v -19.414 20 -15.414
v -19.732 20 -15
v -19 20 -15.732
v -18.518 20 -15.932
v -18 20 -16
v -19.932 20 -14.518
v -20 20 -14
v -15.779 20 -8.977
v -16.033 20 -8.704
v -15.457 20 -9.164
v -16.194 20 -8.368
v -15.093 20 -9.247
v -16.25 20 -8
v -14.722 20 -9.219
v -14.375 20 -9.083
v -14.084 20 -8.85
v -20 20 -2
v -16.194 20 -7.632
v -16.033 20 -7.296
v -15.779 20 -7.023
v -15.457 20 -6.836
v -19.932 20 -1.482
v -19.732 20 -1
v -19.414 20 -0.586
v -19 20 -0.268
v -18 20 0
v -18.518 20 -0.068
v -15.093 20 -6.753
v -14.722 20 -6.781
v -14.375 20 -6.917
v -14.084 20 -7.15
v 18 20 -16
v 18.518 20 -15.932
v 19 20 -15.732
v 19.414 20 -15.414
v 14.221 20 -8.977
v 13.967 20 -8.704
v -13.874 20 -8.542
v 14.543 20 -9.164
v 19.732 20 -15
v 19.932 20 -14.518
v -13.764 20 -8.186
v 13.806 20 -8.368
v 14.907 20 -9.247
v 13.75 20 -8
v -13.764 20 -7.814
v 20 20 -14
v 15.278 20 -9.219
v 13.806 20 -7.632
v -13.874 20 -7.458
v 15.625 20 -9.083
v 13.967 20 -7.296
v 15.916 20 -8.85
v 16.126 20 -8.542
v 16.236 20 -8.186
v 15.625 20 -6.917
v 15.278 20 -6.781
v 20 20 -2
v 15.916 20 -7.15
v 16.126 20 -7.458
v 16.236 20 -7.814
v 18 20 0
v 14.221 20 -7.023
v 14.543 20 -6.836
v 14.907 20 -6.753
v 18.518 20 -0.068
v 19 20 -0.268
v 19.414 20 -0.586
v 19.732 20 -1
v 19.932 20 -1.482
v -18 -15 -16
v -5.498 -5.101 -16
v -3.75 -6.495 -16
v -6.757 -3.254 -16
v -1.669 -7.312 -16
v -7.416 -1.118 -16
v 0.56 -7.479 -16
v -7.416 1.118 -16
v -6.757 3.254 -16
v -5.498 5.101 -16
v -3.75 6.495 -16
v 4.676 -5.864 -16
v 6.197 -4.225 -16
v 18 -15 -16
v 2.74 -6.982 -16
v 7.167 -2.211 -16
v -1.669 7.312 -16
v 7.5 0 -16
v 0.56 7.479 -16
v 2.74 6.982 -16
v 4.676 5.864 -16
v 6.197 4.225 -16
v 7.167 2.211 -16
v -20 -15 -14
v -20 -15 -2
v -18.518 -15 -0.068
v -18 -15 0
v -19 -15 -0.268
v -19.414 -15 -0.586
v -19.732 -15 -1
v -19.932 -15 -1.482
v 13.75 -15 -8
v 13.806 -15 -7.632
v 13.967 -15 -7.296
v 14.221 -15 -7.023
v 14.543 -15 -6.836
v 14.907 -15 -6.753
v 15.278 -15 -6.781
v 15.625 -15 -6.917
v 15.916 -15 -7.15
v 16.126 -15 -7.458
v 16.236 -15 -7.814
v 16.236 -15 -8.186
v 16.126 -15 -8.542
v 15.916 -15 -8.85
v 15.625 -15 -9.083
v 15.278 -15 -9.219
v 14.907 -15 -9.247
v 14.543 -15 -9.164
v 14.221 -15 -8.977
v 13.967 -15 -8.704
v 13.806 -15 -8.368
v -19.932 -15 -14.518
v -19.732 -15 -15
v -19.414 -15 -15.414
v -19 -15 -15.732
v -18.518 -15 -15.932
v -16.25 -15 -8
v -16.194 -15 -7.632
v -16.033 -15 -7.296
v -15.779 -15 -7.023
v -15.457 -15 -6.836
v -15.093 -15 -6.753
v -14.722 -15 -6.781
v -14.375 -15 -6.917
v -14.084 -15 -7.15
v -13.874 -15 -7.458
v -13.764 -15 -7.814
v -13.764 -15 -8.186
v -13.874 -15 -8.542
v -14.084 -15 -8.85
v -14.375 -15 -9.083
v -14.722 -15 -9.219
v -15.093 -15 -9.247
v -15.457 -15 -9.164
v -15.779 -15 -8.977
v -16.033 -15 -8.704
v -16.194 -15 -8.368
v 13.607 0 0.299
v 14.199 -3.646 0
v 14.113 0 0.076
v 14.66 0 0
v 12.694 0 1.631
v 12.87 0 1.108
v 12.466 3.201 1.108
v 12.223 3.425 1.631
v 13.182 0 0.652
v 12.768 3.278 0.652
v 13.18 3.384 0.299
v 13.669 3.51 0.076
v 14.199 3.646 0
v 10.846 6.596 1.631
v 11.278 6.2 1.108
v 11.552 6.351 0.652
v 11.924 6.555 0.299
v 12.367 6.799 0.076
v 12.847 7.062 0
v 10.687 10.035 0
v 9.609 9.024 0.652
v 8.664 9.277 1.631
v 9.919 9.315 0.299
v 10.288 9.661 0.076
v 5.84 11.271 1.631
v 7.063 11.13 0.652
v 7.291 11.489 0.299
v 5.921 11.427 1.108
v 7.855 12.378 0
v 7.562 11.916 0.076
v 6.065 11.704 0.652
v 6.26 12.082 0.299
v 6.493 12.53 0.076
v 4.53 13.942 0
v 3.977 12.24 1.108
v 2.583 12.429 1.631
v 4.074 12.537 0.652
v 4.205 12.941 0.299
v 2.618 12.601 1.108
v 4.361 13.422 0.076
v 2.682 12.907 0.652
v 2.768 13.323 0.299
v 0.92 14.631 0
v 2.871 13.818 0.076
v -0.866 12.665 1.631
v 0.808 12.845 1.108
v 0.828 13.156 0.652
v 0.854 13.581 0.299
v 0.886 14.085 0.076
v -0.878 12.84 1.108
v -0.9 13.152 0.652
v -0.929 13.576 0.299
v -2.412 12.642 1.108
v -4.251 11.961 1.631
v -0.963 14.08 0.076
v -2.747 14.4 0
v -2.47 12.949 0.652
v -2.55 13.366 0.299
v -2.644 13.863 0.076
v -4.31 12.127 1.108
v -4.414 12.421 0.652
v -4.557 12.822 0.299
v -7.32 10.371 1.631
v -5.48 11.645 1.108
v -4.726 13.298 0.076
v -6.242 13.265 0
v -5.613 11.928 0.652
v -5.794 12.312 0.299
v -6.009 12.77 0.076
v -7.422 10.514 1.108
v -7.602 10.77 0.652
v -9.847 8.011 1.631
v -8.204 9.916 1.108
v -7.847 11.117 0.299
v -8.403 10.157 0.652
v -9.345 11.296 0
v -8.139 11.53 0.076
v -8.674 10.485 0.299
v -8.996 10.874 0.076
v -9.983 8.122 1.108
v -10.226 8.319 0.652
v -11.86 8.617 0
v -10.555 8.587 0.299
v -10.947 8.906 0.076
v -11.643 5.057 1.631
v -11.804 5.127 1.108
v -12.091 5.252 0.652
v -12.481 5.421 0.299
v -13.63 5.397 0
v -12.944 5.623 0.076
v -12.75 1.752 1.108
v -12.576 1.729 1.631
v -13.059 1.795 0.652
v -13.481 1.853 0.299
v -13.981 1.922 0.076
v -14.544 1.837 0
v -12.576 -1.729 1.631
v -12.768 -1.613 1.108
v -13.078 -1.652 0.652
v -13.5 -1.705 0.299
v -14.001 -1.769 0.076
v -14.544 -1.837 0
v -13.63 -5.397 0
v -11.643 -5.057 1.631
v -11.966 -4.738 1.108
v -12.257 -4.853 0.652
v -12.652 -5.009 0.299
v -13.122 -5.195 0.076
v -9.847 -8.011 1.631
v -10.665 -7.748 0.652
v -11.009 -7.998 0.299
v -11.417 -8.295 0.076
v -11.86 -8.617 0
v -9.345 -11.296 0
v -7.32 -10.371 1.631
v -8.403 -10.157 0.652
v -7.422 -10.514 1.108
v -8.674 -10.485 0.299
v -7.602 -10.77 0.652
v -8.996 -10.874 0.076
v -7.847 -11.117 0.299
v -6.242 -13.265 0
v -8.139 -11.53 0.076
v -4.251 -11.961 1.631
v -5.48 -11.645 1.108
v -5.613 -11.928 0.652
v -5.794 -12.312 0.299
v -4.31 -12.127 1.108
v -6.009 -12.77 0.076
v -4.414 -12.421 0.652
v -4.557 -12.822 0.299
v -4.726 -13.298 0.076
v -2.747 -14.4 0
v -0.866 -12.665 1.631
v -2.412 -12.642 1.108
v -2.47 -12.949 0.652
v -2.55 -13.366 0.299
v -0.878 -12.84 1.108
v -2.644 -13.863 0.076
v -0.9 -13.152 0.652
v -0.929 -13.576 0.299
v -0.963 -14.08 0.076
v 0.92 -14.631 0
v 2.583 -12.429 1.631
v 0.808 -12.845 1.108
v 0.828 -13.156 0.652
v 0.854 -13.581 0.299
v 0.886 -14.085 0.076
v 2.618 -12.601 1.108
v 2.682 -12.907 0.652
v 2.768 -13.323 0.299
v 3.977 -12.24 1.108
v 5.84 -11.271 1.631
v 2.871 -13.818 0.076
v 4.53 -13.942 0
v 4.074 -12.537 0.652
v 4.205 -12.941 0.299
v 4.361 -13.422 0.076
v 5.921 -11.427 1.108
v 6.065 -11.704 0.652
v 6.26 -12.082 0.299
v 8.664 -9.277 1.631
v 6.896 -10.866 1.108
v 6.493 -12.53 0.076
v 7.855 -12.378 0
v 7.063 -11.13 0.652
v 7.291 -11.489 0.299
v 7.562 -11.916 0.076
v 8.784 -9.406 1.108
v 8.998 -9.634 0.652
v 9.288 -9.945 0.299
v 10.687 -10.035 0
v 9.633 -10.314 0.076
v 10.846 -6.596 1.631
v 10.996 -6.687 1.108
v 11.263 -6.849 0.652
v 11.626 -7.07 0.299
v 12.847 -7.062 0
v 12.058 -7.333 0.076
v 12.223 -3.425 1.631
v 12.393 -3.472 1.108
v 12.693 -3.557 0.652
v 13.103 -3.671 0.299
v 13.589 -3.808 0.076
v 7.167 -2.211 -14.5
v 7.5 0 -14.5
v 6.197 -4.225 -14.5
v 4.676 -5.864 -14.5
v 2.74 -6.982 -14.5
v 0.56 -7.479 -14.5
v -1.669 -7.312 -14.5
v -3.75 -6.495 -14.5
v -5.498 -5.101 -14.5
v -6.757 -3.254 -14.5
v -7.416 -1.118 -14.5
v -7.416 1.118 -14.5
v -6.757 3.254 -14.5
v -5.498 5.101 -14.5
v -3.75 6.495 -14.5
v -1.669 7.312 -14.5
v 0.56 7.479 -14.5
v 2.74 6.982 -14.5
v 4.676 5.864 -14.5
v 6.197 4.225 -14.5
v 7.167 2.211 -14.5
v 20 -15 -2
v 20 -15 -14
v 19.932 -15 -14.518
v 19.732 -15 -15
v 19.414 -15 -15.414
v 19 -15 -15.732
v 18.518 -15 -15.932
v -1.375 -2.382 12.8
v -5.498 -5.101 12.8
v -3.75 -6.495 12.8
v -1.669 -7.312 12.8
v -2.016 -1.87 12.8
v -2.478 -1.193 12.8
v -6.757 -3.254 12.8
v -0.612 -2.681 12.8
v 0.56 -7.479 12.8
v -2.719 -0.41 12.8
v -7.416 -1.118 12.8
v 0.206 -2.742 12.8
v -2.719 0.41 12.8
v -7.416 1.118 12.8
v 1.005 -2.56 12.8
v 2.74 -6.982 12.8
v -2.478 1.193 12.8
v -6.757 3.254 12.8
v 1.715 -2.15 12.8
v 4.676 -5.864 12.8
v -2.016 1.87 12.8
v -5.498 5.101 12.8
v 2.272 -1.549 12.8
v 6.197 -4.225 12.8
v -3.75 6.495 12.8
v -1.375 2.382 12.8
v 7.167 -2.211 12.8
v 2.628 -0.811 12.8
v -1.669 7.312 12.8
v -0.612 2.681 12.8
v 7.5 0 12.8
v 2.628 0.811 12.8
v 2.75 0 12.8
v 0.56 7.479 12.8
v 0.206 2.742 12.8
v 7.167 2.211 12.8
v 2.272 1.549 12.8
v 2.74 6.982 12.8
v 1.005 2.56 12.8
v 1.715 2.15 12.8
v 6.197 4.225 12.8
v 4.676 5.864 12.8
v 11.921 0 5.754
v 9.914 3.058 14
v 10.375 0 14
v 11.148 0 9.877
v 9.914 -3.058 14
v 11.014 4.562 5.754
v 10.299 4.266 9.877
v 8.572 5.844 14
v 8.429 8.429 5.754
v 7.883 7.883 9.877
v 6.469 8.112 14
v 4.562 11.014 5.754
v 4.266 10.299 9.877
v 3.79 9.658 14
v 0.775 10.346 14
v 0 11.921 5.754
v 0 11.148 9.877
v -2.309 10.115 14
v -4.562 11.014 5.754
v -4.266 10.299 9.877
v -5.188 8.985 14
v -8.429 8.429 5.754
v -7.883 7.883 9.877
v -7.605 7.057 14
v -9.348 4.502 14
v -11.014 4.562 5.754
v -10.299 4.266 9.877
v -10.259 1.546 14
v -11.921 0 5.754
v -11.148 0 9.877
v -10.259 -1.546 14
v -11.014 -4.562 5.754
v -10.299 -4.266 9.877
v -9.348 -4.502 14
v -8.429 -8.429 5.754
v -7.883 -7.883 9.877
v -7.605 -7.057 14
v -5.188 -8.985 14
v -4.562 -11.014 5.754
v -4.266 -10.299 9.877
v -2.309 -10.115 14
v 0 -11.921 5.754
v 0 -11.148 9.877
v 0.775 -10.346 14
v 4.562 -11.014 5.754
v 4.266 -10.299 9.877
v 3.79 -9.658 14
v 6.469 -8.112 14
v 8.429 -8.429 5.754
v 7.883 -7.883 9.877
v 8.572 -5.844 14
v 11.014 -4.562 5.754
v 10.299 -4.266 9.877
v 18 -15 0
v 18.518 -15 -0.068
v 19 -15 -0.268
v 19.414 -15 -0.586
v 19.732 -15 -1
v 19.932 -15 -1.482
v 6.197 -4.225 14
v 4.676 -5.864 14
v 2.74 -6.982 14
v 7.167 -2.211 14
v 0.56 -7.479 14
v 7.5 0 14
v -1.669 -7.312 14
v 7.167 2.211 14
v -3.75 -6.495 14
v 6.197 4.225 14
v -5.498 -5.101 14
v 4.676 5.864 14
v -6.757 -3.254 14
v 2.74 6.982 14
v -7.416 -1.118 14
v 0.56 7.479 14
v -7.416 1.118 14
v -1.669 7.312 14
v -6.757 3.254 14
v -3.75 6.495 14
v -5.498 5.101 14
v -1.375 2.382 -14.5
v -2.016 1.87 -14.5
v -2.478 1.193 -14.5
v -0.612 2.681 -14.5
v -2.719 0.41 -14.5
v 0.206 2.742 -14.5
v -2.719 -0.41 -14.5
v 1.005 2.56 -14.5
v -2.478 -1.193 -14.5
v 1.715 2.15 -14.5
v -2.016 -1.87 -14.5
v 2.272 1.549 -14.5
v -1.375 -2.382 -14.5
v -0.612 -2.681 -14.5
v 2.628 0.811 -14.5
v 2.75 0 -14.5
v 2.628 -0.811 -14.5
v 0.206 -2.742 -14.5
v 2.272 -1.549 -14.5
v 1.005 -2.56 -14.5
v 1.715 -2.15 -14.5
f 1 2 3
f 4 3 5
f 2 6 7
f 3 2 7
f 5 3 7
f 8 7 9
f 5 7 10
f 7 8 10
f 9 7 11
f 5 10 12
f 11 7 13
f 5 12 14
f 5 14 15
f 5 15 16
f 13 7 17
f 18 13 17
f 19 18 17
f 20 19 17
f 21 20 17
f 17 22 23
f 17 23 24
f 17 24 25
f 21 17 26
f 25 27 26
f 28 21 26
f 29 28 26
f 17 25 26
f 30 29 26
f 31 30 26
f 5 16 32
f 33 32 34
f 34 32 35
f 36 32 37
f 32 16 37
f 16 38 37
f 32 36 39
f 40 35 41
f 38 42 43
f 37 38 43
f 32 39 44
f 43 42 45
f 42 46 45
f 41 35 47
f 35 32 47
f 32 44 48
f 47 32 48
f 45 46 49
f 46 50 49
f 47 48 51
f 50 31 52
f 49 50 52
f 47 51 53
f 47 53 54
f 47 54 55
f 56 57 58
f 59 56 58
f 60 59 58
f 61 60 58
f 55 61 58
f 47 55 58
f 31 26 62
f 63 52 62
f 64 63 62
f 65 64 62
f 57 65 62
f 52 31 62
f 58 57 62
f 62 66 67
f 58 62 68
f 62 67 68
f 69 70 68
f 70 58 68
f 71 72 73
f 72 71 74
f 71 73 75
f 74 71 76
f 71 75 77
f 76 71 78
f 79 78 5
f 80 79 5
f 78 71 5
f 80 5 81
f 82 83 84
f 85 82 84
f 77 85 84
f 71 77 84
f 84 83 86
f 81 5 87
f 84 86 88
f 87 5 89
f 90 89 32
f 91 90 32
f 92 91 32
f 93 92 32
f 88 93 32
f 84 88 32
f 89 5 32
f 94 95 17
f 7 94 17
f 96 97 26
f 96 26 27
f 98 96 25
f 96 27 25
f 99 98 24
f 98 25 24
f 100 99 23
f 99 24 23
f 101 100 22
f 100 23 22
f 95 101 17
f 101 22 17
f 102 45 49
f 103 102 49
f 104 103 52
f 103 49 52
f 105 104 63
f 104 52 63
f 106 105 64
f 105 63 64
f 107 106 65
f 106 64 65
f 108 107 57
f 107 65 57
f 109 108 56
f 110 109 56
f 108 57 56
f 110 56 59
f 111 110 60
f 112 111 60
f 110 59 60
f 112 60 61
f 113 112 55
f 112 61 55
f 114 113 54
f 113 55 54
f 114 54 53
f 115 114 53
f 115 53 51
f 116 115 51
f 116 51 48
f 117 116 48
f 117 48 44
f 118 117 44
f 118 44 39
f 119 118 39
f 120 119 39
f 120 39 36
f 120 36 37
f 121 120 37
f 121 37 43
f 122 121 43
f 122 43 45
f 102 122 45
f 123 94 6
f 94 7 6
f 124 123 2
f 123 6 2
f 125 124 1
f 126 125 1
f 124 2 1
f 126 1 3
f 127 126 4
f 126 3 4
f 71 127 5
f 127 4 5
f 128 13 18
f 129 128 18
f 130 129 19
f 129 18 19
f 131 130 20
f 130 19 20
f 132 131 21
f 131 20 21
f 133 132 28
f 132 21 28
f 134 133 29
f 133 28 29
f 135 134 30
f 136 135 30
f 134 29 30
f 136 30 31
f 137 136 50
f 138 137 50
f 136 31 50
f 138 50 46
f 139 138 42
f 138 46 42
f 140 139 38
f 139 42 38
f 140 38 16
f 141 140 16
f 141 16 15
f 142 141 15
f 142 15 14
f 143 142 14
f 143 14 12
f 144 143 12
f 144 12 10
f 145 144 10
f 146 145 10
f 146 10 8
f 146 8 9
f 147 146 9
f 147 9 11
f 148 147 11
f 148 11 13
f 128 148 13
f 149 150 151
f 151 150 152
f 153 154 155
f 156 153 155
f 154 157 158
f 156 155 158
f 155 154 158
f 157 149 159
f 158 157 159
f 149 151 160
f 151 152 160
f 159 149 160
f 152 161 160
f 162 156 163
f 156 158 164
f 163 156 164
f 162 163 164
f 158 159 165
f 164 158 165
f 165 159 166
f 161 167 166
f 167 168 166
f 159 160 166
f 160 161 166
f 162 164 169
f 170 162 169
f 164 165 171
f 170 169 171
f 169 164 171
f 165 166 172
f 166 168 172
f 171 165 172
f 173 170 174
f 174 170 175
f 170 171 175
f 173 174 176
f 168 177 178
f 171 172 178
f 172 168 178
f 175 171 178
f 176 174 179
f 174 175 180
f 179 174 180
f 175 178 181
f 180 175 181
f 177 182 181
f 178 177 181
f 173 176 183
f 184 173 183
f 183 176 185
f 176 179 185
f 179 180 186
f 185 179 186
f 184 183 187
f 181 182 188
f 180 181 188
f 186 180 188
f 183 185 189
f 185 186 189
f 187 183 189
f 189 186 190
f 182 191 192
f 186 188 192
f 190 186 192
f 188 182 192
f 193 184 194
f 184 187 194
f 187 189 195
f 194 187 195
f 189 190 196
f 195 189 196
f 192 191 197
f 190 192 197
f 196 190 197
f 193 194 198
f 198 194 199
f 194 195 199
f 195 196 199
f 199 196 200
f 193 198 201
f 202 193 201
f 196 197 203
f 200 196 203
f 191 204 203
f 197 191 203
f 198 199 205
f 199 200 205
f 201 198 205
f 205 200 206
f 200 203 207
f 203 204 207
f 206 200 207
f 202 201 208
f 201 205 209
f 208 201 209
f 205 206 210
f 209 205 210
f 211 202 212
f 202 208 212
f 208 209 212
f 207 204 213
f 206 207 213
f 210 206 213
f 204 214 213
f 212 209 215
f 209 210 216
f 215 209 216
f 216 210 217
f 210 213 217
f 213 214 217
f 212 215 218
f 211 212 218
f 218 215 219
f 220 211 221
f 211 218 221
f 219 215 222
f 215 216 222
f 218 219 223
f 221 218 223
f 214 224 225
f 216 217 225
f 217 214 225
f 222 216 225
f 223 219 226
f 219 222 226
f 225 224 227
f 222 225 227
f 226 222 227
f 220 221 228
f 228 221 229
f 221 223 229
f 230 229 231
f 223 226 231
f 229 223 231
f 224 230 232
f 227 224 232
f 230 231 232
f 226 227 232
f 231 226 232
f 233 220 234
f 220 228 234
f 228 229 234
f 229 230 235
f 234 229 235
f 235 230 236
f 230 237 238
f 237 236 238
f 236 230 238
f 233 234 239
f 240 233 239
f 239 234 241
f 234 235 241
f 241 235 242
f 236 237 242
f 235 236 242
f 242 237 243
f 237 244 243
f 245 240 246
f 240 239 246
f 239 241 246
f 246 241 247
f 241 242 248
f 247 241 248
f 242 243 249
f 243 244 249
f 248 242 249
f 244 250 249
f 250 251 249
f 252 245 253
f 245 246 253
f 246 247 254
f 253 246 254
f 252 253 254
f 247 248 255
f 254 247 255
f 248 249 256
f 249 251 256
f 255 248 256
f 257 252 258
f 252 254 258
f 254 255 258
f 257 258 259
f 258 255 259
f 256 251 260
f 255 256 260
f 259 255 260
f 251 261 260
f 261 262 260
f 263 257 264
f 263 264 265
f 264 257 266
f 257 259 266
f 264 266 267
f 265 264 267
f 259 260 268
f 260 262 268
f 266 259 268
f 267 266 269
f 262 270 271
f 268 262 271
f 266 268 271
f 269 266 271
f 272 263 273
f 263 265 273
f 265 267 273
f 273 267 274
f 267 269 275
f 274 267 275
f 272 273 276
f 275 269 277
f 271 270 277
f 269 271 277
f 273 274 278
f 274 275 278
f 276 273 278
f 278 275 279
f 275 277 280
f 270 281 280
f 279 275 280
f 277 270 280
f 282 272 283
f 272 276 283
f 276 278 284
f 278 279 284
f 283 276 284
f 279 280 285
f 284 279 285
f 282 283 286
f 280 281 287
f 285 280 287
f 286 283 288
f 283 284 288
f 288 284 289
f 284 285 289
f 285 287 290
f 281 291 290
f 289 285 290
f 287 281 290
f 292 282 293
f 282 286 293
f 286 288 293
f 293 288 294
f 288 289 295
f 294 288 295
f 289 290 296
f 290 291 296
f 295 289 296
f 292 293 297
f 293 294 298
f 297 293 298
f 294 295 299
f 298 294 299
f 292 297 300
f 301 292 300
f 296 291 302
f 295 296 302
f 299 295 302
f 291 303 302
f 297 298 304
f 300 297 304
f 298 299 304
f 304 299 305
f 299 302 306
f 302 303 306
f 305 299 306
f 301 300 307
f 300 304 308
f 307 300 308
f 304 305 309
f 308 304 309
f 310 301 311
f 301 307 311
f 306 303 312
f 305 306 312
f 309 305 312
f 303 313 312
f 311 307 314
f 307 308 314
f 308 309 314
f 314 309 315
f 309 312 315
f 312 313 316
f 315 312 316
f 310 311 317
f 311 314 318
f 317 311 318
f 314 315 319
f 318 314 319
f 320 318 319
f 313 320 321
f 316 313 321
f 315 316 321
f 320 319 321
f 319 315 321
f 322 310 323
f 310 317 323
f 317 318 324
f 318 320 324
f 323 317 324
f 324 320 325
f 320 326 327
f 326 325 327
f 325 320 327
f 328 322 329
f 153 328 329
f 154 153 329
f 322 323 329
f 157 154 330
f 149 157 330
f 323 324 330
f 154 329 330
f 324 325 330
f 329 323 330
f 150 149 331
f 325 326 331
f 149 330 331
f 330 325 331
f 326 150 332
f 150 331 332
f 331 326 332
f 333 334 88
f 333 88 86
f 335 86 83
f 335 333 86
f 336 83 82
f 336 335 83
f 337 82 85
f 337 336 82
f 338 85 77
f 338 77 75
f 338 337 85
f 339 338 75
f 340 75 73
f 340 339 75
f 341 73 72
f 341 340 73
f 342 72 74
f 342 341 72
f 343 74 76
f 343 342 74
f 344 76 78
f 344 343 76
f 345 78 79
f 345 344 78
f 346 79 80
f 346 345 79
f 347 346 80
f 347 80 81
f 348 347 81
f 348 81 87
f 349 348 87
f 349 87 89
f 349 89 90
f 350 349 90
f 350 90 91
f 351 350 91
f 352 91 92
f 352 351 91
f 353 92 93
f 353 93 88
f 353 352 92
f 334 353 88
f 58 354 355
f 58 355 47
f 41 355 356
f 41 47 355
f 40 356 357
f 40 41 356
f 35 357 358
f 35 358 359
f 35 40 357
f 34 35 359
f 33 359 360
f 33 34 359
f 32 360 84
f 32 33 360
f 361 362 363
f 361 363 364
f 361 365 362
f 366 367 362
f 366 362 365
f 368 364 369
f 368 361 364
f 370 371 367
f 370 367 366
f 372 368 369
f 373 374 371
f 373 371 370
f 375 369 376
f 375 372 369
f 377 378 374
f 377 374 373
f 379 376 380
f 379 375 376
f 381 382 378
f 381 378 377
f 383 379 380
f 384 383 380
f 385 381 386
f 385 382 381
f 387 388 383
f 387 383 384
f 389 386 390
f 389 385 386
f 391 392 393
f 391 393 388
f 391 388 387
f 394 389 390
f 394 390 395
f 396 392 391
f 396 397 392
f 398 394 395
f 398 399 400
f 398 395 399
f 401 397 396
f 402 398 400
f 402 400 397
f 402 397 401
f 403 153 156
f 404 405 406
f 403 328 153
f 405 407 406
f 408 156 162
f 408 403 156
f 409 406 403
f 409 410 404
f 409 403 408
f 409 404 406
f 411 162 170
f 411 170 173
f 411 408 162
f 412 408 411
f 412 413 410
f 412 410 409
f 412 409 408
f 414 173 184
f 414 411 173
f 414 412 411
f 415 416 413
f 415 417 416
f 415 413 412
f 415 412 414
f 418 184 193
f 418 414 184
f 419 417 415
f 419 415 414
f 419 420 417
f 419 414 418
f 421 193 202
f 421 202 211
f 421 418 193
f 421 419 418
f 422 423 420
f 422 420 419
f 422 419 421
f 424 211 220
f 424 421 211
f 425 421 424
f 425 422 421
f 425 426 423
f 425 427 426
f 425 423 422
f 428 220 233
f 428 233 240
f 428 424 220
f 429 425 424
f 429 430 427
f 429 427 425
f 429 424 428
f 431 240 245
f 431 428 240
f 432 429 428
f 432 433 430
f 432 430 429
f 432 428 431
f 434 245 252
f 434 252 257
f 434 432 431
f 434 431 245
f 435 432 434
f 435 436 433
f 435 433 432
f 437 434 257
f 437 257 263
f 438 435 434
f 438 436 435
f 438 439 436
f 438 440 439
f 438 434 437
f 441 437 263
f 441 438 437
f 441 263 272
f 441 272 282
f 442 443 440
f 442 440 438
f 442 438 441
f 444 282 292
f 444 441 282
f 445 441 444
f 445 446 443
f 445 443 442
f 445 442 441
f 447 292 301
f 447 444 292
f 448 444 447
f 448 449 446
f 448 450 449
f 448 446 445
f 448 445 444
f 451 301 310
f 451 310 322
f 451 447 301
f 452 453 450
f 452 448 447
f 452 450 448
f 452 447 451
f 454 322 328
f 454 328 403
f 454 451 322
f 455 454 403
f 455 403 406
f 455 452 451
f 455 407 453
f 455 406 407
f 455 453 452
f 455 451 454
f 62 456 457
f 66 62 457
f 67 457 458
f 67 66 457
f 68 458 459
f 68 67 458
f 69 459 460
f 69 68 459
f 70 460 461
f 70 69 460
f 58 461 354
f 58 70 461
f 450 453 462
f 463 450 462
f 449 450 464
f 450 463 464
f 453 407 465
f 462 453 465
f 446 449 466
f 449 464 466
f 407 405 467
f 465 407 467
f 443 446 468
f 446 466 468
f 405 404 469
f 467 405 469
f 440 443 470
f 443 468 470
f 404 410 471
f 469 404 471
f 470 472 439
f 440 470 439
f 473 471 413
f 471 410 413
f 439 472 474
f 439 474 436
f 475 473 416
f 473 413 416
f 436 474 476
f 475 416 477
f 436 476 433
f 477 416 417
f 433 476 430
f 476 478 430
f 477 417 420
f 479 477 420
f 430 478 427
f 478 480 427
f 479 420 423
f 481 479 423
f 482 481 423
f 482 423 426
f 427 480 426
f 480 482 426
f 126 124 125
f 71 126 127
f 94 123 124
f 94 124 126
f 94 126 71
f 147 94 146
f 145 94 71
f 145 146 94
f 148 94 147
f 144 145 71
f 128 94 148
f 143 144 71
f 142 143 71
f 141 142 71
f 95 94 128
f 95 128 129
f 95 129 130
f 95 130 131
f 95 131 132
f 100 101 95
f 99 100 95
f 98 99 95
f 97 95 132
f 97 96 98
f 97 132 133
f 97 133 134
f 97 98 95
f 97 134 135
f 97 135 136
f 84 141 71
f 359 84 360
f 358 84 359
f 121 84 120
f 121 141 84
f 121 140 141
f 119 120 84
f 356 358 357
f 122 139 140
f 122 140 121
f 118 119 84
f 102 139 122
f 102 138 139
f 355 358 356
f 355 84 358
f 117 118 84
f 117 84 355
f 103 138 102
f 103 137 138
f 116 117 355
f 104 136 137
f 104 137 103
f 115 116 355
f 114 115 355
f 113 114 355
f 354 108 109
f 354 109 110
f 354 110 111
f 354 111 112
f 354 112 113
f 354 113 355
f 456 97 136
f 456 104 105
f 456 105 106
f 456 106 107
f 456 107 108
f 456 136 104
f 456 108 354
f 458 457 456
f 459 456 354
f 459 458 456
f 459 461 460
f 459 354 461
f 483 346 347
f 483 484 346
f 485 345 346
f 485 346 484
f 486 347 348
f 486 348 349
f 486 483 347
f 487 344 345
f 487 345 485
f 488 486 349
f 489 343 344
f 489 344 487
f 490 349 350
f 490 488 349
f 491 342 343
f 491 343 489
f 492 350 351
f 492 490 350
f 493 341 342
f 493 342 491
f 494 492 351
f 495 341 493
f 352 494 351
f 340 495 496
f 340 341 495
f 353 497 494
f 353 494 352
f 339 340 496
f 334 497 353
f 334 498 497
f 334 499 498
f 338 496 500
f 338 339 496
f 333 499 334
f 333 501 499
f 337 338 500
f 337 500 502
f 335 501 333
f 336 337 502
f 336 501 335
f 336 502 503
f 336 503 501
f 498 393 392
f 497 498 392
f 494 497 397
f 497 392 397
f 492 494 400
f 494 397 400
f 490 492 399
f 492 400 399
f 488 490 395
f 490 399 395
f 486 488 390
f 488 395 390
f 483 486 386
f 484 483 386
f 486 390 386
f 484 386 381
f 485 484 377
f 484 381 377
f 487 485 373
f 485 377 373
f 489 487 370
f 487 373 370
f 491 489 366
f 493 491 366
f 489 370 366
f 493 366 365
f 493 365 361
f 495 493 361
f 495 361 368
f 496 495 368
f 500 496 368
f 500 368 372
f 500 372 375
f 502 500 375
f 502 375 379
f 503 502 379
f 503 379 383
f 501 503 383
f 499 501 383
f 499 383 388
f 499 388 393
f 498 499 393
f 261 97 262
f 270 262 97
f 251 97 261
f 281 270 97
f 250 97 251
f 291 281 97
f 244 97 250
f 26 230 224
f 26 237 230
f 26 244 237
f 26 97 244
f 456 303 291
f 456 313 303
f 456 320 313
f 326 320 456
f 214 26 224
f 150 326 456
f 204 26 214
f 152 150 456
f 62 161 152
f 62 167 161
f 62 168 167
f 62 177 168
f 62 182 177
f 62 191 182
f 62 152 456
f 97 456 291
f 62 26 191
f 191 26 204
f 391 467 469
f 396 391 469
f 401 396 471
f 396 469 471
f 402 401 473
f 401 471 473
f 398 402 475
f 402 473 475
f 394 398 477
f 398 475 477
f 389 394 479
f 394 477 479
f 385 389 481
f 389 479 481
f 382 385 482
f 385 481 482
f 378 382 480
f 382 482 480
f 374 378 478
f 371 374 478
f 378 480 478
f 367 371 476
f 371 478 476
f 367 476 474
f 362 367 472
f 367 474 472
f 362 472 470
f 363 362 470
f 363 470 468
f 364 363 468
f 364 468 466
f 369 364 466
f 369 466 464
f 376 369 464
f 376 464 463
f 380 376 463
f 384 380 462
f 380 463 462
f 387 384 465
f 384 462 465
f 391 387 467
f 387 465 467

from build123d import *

# Parameters (mm, degrees)
SKETCH_1_W             = 40
SKETCH_1_H             = 35
EXTRUDE_457_DEPTH      = 16
SKETCH_2_R             = 10
EXTRUDE_593_DEPTH      = 14
SKETCH_4_R             = 2.75
CUT_EXTRUDE_684_DEPTH  = 42.231056256
CHAMFER_2_SIZE         = 3
CHAMFER_2_SIZE_2       = 16
FILLET_5_R             = 2
SKETCH_7_R             = 1.25
CUT_EXTRUDE_1001_DEPTH = 44.370496884
FILLET_7_R             = 2
SKETCH_8_R             = 7.5
CUT_EXTRUDE_1355_DEPTH = 1.2
CUT_EXTRUDE_START      = -1.5
SKETCH_9_R             = 7.5
CUT_EXTRUDE_1489_DEPTH = 1.5


with BuildPart() as part:
    # Эскиз1 → Extrude 457 (new body)
    with BuildSketch(Plane.XY):
        with Locations((0, 2.5)):
            Rectangle(SKETCH_1_W, SKETCH_1_H)
    extrude(amount=-EXTRUDE_457_DEPTH)

    # Эскиз2 → Extrude 593 (add)
    with BuildSketch(Plane.XY):
        Circle(SKETCH_2_R)
    extrude(amount=EXTRUDE_593_DEPTH)

    # Эскиз4 → Cut-Extrude 684 (cut, through all)
    with BuildSketch(Plane.XY.offset(14)):
        Circle(SKETCH_4_R)
    extrude(amount=-CUT_EXTRUDE_684_DEPTH, mode=Mode.SUBTRACT)

    # Фаска2
    # the kernel refuses this chamfer: 16, 3 mm, written as the material it adds along each edge
    with BuildSketch(Plane(origin=(0, 0, 0), x_dir=(1, 0, 0), z_dir=(0, -1, 0))) as chamfer_2_piece_1_section:
        Polygon((10 + CHAMFER_2_SIZE, 0), (10, CHAMFER_2_SIZE_2), (10, 0), align=None)
    chamfer_2_piece_1 = revolve(axis=Axis((0, 0, 0), (0, 0, 1)), mode=Mode.PRIVATE)
    chamfer_2_piece_1 = split(chamfer_2_piece_1, bisect_by=Plane(origin=(-11.622307858, 0, 14), z_dir=(0, 0, -1)), keep=Keep.TOP, mode=Mode.PRIVATE)
    add(chamfer_2_piece_1)

    # Скругление5
    fillet_5_edges = [part.edges().sort_by_distance(p)[0] for p in [
        (-13, 0, 0),
    ]]
    fillet(fillet_5_edges, radius=FILLET_5_R)

    # Эскиз7 → Cut-Extrude 1001 (cut, through all)
    with BuildSketch(Plane(origin=(0, 20, 0), x_dir=(1, 0, 0), z_dir=(0, 1, 0))):
        with Locations(Location((-15, 8, 0), (0, 0, 180))):
            Circle(SKETCH_7_R)
        with Locations(Location((15, 8, 0), (0, 0, 180))):
            Circle(SKETCH_7_R)
    extrude(amount=-CUT_EXTRUDE_1001_DEPTH, mode=Mode.SUBTRACT)

    # Скругление7
    fillet_7_edges = [part.edges().sort_by_distance(p)[0] for p in [
        (20, 2.5, -16),
        (-20, 2.5, -16),
        (20, 2.5, 0),
        (-20, 2.5, 0),
    ]]
    fillet(fillet_7_edges, radius=FILLET_7_R)

    # Эскиз8 → Cut-Extrude 1355 (cut)
    with BuildSketch(Plane.XY.offset(14)):
        Circle(SKETCH_8_R)
    extrude(amount=-CUT_EXTRUDE_1355_DEPTH, mode=Mode.SUBTRACT)

    # Эскиз9 → Cut-Extrude 1489 (cut)
    with BuildSketch(Plane(origin=(0, 0, -16), x_dir=(-1, 0, 0), z_dir=(0, 0, -1)).offset(CUT_EXTRUDE_START)):
        with Locations(Location((0, 0, 0), (0, 0, 180))):
            Circle(SKETCH_9_R)
    extrude(amount=CUT_EXTRUDE_1489_DEPTH, mode=Mode.SUBTRACT)


solid = part.part
